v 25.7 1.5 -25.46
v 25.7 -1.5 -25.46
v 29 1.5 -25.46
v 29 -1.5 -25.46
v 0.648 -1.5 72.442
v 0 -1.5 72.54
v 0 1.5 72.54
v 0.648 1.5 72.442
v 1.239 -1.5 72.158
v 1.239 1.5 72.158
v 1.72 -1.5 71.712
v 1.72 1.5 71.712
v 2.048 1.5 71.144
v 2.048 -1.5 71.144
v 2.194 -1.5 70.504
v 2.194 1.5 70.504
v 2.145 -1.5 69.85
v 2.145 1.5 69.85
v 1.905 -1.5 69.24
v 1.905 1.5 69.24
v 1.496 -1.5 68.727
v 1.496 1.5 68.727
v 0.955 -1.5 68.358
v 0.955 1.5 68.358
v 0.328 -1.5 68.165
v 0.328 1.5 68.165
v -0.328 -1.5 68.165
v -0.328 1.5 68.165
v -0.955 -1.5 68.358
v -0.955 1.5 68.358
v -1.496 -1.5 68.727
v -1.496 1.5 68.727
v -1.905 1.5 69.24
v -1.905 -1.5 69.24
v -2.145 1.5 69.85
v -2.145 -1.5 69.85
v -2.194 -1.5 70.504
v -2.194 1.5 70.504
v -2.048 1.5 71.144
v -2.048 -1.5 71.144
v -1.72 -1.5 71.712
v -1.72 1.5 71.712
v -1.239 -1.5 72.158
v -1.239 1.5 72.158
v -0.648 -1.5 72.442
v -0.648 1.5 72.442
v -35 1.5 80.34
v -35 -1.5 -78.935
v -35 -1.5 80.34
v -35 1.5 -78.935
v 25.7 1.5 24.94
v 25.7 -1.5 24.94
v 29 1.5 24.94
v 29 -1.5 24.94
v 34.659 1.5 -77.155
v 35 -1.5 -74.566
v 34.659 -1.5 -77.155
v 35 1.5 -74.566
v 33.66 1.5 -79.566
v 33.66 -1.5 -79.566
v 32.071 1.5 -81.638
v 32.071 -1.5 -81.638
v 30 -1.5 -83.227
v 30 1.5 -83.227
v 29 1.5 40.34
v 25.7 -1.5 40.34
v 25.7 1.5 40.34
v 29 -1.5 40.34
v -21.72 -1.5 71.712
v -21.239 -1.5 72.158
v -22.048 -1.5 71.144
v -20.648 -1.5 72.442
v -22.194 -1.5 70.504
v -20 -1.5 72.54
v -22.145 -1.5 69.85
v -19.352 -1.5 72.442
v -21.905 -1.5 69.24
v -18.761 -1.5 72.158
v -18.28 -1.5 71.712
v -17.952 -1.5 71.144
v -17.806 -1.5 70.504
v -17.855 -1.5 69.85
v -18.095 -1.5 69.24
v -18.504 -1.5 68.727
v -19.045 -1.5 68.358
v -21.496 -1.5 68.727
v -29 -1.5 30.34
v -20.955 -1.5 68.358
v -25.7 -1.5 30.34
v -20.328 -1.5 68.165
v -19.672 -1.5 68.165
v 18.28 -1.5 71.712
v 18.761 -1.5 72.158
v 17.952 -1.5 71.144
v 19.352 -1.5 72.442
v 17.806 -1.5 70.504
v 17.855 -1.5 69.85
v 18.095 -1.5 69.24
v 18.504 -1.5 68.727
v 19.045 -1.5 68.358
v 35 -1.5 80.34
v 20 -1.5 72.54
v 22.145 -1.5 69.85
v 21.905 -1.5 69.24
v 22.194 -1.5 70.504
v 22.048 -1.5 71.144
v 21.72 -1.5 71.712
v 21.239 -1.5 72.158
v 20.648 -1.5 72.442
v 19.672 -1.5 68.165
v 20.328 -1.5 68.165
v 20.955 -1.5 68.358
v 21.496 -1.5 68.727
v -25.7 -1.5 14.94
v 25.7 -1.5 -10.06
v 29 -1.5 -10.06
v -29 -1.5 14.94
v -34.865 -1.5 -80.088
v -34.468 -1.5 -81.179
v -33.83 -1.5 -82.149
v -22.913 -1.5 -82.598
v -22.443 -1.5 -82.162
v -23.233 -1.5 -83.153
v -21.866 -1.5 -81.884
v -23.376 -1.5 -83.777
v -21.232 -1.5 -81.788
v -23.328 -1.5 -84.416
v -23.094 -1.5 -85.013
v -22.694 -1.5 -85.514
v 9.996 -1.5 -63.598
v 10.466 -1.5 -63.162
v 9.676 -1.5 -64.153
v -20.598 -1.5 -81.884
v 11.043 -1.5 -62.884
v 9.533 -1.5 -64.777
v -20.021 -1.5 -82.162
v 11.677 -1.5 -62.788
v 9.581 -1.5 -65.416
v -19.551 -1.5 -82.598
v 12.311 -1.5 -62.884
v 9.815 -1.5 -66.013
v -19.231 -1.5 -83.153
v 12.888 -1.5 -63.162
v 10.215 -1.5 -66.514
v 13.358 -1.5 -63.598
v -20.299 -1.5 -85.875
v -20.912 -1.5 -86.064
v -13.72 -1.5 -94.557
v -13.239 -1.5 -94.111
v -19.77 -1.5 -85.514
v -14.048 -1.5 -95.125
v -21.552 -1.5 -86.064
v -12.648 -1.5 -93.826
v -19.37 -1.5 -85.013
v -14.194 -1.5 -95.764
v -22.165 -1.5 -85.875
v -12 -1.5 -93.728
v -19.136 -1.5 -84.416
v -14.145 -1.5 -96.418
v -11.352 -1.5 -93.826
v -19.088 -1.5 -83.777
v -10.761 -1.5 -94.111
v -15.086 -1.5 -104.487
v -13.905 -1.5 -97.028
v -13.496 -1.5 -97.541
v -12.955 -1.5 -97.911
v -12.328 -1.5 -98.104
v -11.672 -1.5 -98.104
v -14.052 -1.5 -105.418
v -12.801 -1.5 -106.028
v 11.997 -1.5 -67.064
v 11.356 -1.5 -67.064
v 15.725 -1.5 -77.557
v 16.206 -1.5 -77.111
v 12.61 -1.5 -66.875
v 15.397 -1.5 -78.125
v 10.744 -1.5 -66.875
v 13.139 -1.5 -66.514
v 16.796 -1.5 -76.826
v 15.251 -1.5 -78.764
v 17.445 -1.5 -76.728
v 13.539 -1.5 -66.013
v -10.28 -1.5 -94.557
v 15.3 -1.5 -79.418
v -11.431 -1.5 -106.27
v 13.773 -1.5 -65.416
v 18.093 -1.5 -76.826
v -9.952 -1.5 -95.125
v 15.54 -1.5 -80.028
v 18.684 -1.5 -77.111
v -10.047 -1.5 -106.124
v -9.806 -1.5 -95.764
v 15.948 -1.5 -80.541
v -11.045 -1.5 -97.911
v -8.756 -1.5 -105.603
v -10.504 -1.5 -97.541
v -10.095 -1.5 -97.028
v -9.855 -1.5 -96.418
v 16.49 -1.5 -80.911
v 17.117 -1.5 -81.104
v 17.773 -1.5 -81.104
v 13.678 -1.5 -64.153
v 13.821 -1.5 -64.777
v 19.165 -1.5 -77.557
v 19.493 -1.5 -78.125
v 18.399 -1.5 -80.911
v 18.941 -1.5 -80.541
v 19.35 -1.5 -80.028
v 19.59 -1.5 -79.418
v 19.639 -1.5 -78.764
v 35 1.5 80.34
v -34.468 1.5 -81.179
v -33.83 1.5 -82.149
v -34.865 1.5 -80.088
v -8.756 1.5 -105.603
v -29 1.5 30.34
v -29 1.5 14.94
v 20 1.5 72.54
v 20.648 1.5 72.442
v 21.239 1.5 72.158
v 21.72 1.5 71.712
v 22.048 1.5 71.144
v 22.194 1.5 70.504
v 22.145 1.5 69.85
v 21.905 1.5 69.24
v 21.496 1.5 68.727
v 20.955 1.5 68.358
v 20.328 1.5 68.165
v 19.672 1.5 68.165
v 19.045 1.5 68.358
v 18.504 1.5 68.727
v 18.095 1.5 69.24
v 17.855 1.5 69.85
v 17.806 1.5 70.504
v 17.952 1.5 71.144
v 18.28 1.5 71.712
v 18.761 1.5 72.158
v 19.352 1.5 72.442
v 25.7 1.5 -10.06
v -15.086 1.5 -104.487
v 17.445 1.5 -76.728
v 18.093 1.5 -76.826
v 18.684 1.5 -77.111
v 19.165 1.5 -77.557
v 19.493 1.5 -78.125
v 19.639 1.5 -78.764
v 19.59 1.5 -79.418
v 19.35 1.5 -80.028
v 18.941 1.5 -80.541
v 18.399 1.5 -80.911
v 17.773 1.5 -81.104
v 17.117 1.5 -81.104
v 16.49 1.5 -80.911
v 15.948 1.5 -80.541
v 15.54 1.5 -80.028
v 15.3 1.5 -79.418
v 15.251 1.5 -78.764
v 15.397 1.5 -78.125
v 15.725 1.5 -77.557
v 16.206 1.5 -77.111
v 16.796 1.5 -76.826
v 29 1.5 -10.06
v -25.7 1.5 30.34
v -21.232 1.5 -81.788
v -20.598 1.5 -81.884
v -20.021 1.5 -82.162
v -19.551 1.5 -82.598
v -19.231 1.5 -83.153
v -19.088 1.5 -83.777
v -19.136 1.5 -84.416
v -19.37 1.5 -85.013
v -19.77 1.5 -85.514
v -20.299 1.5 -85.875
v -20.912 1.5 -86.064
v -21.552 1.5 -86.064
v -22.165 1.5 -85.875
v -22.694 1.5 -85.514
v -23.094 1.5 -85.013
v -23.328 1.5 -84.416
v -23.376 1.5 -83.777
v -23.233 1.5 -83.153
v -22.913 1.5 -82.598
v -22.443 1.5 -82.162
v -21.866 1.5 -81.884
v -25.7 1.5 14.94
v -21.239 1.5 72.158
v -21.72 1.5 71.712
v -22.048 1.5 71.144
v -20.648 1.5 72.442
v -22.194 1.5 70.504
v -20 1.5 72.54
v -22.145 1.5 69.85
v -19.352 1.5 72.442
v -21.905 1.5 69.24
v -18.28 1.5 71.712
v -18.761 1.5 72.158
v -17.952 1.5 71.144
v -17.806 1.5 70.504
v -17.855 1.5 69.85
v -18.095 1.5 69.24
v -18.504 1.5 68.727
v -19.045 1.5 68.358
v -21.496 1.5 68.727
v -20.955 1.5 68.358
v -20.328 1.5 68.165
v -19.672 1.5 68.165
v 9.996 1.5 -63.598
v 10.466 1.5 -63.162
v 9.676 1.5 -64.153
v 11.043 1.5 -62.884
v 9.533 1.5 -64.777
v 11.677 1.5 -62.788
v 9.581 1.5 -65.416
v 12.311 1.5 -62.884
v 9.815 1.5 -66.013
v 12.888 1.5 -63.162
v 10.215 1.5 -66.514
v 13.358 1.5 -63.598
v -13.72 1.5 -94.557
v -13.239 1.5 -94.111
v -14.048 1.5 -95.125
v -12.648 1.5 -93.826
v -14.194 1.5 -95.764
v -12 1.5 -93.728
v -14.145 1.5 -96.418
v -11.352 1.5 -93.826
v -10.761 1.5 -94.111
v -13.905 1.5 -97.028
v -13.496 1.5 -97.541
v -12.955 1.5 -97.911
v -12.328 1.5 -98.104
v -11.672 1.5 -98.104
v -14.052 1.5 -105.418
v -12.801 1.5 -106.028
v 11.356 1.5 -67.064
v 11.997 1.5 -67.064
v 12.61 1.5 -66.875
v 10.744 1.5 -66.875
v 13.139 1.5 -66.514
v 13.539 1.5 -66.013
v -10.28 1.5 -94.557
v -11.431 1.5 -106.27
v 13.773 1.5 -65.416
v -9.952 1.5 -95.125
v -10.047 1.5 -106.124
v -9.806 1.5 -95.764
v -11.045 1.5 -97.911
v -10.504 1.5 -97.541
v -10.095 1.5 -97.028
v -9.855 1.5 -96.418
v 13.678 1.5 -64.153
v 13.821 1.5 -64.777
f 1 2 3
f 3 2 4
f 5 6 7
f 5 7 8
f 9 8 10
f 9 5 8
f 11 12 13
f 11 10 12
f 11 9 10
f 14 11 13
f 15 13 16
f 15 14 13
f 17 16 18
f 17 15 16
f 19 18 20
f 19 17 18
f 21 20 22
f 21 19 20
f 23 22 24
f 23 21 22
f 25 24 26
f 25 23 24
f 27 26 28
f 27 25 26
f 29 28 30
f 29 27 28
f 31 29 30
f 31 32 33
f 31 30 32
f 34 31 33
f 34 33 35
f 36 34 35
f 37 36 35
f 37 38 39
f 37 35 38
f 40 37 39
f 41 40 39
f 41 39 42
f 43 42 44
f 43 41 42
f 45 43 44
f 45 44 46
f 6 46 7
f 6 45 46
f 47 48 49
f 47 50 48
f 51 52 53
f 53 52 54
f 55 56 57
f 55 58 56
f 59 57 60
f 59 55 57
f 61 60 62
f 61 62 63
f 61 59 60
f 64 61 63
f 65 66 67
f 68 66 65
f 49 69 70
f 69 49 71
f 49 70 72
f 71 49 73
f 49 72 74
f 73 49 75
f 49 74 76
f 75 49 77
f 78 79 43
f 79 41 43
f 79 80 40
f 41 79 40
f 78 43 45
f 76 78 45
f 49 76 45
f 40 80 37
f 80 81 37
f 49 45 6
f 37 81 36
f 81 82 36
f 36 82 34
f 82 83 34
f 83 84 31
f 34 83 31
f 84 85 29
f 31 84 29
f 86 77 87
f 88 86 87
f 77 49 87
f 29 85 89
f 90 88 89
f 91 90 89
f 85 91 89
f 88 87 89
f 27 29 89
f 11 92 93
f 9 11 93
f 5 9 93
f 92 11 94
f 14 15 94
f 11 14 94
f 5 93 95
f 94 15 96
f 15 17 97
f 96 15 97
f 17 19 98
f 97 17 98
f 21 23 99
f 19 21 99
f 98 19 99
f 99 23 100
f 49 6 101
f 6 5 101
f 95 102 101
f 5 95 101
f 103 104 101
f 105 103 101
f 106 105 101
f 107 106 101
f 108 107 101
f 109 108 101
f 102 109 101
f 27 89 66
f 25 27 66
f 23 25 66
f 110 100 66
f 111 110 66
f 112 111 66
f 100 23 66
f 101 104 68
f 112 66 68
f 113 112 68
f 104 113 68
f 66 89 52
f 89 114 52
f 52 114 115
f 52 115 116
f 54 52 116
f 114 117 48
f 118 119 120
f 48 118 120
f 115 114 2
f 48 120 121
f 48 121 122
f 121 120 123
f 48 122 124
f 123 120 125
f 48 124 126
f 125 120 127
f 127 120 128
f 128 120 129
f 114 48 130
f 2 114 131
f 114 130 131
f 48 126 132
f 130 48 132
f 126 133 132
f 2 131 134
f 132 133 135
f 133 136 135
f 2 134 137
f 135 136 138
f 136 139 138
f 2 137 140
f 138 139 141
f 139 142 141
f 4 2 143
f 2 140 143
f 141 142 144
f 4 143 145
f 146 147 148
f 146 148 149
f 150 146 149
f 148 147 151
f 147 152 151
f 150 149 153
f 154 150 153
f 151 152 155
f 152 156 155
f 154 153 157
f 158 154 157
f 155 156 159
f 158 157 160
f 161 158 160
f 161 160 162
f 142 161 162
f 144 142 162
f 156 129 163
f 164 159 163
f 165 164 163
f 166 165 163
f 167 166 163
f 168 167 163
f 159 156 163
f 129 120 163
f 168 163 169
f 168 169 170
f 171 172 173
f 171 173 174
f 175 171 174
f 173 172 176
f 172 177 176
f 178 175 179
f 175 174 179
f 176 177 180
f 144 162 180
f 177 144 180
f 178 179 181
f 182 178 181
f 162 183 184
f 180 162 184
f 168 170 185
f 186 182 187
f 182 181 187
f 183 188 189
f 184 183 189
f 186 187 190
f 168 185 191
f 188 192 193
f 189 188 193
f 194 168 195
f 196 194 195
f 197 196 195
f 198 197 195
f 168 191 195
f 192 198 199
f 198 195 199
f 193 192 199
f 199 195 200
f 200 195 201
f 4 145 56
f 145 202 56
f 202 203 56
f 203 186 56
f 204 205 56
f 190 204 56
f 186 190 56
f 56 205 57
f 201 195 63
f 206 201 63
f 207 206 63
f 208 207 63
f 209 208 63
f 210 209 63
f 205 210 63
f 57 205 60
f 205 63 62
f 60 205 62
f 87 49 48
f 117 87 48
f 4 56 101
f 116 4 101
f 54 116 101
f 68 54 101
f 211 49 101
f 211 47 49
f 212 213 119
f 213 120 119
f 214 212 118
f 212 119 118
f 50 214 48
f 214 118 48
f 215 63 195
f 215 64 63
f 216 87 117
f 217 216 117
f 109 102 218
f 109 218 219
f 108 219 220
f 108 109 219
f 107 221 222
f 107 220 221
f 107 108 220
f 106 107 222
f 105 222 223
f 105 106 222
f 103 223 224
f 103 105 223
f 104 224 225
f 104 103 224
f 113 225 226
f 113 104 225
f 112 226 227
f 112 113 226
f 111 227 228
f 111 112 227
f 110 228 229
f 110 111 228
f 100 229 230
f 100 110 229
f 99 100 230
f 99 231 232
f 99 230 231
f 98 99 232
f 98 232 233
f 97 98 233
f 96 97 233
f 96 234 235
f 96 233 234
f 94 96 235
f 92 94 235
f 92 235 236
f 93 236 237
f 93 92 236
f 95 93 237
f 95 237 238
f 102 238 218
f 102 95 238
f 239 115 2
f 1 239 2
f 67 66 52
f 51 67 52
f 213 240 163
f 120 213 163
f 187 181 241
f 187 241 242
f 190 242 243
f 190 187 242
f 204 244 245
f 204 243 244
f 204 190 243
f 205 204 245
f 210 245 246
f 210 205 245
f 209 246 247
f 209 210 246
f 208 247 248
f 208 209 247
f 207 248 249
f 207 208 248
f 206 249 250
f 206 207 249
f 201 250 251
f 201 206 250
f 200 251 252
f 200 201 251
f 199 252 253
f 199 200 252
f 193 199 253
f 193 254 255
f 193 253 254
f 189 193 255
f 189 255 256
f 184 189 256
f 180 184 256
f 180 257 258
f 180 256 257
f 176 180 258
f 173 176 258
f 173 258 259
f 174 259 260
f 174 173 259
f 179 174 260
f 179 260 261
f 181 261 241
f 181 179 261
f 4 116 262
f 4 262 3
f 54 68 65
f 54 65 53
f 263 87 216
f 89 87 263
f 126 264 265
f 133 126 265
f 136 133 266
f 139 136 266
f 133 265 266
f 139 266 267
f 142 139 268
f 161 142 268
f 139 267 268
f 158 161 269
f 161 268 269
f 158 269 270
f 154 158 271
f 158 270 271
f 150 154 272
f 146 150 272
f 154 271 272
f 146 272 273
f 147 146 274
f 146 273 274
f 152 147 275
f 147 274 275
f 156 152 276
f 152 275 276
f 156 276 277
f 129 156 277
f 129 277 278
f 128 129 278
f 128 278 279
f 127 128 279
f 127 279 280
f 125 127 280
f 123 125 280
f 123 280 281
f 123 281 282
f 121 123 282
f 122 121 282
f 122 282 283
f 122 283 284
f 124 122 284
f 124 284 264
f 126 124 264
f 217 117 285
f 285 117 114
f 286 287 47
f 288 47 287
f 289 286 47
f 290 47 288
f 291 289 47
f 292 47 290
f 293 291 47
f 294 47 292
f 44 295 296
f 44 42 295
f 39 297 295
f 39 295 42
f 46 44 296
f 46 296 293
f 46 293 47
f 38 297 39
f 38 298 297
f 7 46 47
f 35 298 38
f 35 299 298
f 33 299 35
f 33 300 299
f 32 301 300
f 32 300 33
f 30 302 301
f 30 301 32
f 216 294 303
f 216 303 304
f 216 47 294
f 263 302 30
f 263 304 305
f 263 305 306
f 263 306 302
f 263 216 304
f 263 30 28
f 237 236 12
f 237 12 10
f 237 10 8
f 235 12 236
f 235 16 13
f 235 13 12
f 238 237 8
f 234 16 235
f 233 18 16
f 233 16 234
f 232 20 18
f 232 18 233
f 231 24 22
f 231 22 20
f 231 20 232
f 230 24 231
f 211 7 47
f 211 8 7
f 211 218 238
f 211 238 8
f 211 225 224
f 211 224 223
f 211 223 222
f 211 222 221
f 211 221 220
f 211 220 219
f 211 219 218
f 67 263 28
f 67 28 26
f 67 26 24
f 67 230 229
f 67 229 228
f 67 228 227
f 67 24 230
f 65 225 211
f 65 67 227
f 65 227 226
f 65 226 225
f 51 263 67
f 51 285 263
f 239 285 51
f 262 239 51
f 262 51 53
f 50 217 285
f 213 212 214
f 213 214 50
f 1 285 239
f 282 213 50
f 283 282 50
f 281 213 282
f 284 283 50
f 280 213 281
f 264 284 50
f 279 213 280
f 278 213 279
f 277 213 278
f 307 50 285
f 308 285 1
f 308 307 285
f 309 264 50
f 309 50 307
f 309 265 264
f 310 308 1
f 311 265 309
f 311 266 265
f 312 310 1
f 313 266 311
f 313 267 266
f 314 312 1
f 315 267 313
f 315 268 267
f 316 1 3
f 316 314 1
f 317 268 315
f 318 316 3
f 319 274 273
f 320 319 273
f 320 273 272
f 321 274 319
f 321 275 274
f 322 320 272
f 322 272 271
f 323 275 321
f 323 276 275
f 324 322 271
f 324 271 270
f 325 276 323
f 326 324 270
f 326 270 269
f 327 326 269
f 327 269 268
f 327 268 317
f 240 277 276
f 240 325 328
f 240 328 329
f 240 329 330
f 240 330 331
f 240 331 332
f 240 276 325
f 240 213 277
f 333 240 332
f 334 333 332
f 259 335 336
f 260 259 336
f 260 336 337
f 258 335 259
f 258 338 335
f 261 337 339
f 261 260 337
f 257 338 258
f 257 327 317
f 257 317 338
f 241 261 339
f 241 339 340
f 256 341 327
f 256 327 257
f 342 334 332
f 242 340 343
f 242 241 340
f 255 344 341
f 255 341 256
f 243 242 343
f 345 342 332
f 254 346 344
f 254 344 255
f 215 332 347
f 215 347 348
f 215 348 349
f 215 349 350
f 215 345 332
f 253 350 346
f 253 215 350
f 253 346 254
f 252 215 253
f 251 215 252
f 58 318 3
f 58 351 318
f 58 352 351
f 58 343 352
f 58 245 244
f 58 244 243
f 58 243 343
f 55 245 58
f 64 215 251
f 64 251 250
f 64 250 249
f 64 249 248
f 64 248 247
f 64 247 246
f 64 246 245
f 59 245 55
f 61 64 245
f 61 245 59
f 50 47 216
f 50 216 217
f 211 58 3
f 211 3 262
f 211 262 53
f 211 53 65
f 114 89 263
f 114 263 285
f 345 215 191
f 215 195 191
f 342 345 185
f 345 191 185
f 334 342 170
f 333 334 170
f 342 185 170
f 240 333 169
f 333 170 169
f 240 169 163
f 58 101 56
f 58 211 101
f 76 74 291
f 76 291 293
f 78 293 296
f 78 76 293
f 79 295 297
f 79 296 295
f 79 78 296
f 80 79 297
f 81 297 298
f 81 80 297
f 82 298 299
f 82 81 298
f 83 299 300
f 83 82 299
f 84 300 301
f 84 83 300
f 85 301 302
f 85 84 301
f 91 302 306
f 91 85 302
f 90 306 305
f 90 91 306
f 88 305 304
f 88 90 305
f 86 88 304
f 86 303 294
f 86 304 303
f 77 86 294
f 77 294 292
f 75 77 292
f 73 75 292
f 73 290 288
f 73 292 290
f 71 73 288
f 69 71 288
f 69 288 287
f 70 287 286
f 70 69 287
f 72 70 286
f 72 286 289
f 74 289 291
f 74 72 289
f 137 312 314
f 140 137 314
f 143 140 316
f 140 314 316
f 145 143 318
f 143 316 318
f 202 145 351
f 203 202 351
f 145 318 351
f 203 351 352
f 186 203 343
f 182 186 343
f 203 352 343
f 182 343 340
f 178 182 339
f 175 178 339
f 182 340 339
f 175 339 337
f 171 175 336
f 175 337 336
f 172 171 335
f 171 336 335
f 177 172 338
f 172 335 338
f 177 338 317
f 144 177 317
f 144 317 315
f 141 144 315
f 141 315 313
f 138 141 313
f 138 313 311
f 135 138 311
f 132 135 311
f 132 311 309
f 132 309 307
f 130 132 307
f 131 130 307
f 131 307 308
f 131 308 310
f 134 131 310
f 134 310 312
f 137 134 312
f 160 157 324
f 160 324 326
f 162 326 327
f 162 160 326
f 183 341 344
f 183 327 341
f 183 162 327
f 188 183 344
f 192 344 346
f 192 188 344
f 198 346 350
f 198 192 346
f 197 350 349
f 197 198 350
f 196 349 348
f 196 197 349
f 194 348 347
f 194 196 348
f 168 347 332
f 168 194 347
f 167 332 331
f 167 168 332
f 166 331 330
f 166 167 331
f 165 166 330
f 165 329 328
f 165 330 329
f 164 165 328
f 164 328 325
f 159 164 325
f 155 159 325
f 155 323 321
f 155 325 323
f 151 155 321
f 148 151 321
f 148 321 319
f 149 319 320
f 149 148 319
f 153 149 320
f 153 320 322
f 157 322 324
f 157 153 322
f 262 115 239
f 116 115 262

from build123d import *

# Parameters (mm, degrees)
SKETCH_1_W               = 70
SKETCH_1_H               = 160.68
EXTRUDE_1_DEPTH          = 1.5
CUT_EXTRUDE_1_DEPTH      = 126.760303041
CUT_EXTRUDE_1_DEPTH_BACK = 126.760303041
SKETCH_2_R               = 2.2
FILLET_2_R               = 10
CUT_EXTRUDE_2_DEPTH      = 126.760303041
CUT_EXTRUDE_2_DEPTH_BACK = 126.760303041
SKETCH_3_R               = 2.2
CHAMFER_2_SIZE           = 40
CHAMFER_2_SIZE2          = 26.108145787
FILLET_3_R               = 5
CUT_EXTRUDE_3_DEPTH      = 112.92791923
CUT_EXTRUDE_3_DEPTH_BACK = 112.92791923
SKETCH_4_W               = 3.3
SKETCH_4_H               = 15.4
SKETCH_5_R               = 2.15
CUT_EXTRUDE_4_DEPTH      = 10


with BuildPart() as part:
    # 草图1 → 凸台-拉伸1 (new, symmetric)
    with BuildSketch(Plane(origin=(0, 0, 0), x_dir=(1, 0, 0), z_dir=(0, 1, 0))):
        Rectangle(SKETCH_1_W, SKETCH_1_H)
        Polygon((35, 80.34), (-35, 120.754518843), (-35, 80.34), align=None)
    extrude(amount=EXTRUDE_1_DEPTH, both=True)

    # 草图2 → 切除-拉伸1 (cut, two sides: drawn at the far end of the back side and taken through both)
    with BuildSketch(Plane(origin=(0, 1.5, 0), x_dir=(1, 0, 0), z_dir=(0, 1, 0)).offset(-CUT_EXTRUDE_1_DEPTH_BACK)):
        with Locations(Location((-12, 95.928457268, 0), (0, 0, 270))):
            Circle(SKETCH_2_R)
        with Locations(Location((17.444863729, 78.928457268, 0), (0, 0, 270))):
            Circle(SKETCH_2_R)
    extrude(amount=CUT_EXTRUDE_1_DEPTH + CUT_EXTRUDE_1_DEPTH_BACK, mode=Mode.SUBTRACT)

    # 圆角2
    fillet_2_edges = [part.edges().sort_by_distance(p)[0] for p in [
        (35, 0, -80.34),
    ]]
    fillet(fillet_2_edges, radius=FILLET_2_R)

    # 草图3 → 切除-拉伸2 (cut, two sides: drawn at the far end of the back side and taken through both)
    with BuildSketch(Plane(origin=(0, 1.5, 0), x_dir=(1, 0, 0), z_dir=(0, 1, 0)).offset(-CUT_EXTRUDE_2_DEPTH_BACK)):
        with Locations(Location((0, -70.34, 0), (0, 0, 270))):
            Circle(SKETCH_3_R)
        with Locations(Location((-20, -70.34, 0), (0, 0, 270))):
            Circle(SKETCH_3_R)
        with Locations(Location((20, -70.34, 0), (0, 0, 270))):
            Circle(SKETCH_3_R)
    extrude(amount=CUT_EXTRUDE_2_DEPTH + CUT_EXTRUDE_2_DEPTH_BACK, mode=Mode.SUBTRACT)

    # 倒角2
    chamfer_2_edges = [part.edges().sort_by_distance(p)[0] for p in [
        (-35, 0, -120.754518843),
    ]]
    chamfer_2_side = [part.faces().sort_by_distance(p)[0] for p in [
        (-35, 0, -20.207259422),
    ]]
    chamfer(chamfer_2_edges, length=CHAMFER_2_SIZE, length2=CHAMFER_2_SIZE2, reference=chamfer_2_side[0])

    # 圆角3
    fillet_3_edges = [part.edges().sort_by_distance(p)[0] for p in [
        (-35, 0, -80.754518843),
        (-12.389682503, 0, -107.70044595),
    ]]
    fillet(fillet_3_edges, radius=FILLET_3_R)

    # 草图4 → 切除-拉伸3 (cut, two sides: drawn at the far end of the back side and taken through both)
    with BuildSketch(Plane(origin=(0, 1.5, 0), x_dir=(1, 0, 0), z_dir=(0, 1, 0)).offset(-CUT_EXTRUDE_3_DEPTH_BACK)):
        with Locations((-27.35, -22.64)):
            Rectangle(SKETCH_4_W, SKETCH_4_H)
        with Locations((27.35, -32.64)):
            Rectangle(SKETCH_4_W, SKETCH_4_H)
        with Locations((27.35, 17.76)):
            Rectangle(SKETCH_4_W, SKETCH_4_H)
    extrude(amount=CUT_EXTRUDE_3_DEPTH + CUT_EXTRUDE_3_DEPTH_BACK, mode=Mode.SUBTRACT)

    # 草图5 → 切除-拉伸4 (cut)
    with BuildSketch(Plane(origin=(0, 1.5, 0), x_dir=(1, 0, 0), z_dir=(0, 1, 0))):
        with Locations(Location((-21.232050808, 83.938076211, 0), (0, 0, 270))):
            Circle(SKETCH_5_R)
        with Locations(Location((11.676914536, 64.938076211, 0), (0, 0, 270))):
            Circle(SKETCH_5_R)
    extrude(amount=-CUT_EXTRUDE_4_DEPTH, mode=Mode.SUBTRACT)


solid = part.part
